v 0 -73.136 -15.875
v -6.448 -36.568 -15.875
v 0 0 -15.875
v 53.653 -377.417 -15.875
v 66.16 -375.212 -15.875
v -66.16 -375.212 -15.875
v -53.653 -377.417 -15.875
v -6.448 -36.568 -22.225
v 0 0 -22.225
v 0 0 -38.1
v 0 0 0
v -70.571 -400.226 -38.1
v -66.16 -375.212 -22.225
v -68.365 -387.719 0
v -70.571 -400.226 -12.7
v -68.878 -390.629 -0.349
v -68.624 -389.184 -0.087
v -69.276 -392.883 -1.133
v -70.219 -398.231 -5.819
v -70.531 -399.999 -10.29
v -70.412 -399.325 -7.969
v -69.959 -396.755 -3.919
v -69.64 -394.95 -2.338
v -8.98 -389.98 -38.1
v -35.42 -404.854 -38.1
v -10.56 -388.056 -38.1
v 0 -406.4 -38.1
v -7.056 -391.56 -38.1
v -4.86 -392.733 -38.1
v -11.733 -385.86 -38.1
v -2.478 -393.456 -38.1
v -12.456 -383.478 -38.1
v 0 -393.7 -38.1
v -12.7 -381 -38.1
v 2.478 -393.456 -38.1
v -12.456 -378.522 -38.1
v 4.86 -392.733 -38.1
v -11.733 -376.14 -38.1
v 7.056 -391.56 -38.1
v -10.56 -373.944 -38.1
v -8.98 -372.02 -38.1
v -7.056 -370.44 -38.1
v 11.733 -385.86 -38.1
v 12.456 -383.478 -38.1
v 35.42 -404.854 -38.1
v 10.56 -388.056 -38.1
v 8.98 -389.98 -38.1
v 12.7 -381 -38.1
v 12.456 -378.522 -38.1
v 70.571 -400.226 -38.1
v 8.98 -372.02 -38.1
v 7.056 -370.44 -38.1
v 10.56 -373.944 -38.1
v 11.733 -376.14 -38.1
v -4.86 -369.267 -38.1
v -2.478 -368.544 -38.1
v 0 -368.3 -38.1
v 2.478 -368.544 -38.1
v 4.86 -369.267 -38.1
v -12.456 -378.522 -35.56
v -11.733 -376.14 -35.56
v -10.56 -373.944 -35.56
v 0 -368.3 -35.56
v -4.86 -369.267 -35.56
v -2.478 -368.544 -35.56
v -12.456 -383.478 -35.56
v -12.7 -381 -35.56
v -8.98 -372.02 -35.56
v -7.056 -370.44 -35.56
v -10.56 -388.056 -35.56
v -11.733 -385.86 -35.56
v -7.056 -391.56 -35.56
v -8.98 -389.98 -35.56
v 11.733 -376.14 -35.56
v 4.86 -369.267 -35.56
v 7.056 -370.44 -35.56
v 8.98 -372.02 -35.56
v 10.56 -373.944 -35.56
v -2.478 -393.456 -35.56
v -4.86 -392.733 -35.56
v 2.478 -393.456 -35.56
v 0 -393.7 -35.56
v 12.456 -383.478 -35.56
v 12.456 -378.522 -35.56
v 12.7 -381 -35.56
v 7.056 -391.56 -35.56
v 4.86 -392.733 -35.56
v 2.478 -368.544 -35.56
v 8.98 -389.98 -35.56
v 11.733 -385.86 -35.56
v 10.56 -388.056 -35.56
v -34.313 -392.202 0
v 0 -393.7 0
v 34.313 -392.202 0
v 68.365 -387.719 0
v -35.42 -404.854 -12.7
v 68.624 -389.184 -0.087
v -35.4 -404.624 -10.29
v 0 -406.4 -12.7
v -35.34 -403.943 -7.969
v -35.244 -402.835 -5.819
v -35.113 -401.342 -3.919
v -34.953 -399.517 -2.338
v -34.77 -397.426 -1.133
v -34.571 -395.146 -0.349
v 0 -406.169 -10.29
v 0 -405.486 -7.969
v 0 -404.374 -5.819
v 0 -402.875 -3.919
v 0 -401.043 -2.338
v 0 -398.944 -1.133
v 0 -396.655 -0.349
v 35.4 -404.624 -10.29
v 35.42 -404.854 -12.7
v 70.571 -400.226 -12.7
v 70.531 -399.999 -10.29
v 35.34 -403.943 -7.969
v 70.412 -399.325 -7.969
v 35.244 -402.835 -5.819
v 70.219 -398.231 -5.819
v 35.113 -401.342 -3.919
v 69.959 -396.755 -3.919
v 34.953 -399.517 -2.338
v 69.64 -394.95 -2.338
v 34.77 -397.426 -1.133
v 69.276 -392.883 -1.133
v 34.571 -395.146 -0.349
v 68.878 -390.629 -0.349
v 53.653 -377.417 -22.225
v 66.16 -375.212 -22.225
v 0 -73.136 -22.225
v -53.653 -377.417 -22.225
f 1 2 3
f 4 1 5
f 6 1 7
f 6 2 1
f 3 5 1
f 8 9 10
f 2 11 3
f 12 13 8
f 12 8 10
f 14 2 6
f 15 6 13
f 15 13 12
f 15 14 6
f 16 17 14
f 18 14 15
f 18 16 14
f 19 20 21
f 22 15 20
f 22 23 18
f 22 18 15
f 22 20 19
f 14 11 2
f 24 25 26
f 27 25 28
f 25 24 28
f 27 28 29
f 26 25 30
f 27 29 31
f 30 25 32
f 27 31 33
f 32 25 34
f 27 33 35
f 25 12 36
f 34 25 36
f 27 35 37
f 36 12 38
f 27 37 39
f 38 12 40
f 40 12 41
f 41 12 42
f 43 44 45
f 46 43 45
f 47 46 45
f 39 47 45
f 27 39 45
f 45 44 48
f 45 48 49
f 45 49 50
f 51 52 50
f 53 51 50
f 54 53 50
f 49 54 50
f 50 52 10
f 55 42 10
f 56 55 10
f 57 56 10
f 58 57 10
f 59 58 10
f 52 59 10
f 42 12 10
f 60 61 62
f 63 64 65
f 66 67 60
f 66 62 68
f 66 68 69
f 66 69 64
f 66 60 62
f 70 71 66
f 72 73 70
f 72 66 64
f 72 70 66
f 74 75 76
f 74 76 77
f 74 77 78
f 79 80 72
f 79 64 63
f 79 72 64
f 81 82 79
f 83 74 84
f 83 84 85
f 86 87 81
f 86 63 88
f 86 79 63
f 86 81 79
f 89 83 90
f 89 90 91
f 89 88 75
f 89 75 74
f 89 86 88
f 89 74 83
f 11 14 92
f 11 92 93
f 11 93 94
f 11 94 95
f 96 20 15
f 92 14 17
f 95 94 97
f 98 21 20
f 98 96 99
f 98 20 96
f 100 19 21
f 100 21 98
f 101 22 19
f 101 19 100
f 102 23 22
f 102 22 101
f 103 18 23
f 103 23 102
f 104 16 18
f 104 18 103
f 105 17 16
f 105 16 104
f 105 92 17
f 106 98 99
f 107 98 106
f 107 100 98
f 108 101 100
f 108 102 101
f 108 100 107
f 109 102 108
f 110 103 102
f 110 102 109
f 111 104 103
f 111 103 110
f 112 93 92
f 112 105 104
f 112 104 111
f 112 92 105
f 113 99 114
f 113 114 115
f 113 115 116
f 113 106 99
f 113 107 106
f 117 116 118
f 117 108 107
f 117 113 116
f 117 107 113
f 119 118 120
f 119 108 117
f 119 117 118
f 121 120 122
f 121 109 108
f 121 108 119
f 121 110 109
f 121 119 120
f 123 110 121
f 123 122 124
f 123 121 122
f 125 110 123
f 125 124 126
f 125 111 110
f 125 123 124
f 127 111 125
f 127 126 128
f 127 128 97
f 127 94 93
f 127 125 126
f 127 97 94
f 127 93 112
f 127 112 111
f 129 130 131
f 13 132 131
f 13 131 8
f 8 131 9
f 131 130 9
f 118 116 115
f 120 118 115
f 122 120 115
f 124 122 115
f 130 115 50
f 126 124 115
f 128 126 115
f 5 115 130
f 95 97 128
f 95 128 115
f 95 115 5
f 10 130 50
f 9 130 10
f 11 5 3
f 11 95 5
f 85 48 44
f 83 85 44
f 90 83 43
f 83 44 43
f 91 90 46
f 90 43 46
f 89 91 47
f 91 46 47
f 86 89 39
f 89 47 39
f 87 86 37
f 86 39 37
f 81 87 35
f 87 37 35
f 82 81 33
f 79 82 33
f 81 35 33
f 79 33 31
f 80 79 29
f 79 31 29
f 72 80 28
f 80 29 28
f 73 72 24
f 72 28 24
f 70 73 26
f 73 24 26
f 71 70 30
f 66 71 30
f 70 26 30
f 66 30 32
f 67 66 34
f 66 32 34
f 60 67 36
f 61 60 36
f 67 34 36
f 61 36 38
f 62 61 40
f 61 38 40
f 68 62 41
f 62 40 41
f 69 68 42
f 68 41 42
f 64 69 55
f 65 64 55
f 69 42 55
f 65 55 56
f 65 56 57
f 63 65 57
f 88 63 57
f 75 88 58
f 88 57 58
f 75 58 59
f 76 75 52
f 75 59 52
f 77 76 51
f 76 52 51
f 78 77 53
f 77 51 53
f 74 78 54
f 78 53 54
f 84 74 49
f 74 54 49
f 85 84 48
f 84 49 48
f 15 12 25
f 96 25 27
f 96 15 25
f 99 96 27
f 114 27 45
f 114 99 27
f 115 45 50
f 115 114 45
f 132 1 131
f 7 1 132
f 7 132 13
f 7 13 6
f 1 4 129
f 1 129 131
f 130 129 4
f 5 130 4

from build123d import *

# Parameters (mm, degrees)
F1_DEPTH = 38.1
F2_R     = 12.7
F3_W     = 381
F3_H     = 6.35
F4_DEPTH = 12.7
F5_W     = 343.8676841179
F5_H     = 6.35
F6_DEPTH = 12.7
F7_R     = 12.7
F8_DEPTH = 2.54


with BuildPart() as f1:
    # F0 (on Top) → F1 (new body)
    with BuildSketch(Plane.XY):
        with BuildLine():
            Line((0, 0), (-70.5706194038, -400.2258708242))
            ThreePointArc((-70.5706194038, -400.2258708242), (0, -406.4), (70.5706194038, -400.2258708242))
            Line((70.5706194038, -400.2258708242), (0, 0))
        make_face()
    extrude(amount=-F1_DEPTH)

    # F2
    f2_edges = [f1.edges().sort_by_distance(p)[0] for p in [
        (0, -406.4, 0),
    ]]
    fillet(f2_edges, radius=F2_R)

    # F3 (on face) → F4 (cut)
    with BuildSketch(Plane(origin=(0, 0, 0), x_dir=(-0.1736481777, 0.984807753, 0), z_dir=(0.984807753, 0.1736481777, 0))):
        with Locations((-190.5, -19.05)):
            Rectangle(F3_W, F3_H)
    extrude(amount=-F4_DEPTH, mode=Mode.SUBTRACT)

    # F5 (on face) → F6 (cut)
    with BuildSketch(Plane(origin=(0, 0, 0), x_dir=(-0.1736481777, -0.984807753, 0), z_dir=(-0.984807753, 0.1736481777, 0))):
        with Locations((209.066157941, -19.05)):
            Rectangle(F5_W, F5_H)
    extrude(amount=-F6_DEPTH, mode=Mode.SUBTRACT)

    # F7 (on face) → F8 (cut)
    with BuildSketch(Plane(origin=(0, 0, -38.1), x_dir=(1, 0, 0), z_dir=(0, 0, -1))):
        with Locations((0, 381)):
            Circle(F7_R)
    extrude(amount=-F8_DEPTH, mode=Mode.SUBTRACT)


solid = f1.part
